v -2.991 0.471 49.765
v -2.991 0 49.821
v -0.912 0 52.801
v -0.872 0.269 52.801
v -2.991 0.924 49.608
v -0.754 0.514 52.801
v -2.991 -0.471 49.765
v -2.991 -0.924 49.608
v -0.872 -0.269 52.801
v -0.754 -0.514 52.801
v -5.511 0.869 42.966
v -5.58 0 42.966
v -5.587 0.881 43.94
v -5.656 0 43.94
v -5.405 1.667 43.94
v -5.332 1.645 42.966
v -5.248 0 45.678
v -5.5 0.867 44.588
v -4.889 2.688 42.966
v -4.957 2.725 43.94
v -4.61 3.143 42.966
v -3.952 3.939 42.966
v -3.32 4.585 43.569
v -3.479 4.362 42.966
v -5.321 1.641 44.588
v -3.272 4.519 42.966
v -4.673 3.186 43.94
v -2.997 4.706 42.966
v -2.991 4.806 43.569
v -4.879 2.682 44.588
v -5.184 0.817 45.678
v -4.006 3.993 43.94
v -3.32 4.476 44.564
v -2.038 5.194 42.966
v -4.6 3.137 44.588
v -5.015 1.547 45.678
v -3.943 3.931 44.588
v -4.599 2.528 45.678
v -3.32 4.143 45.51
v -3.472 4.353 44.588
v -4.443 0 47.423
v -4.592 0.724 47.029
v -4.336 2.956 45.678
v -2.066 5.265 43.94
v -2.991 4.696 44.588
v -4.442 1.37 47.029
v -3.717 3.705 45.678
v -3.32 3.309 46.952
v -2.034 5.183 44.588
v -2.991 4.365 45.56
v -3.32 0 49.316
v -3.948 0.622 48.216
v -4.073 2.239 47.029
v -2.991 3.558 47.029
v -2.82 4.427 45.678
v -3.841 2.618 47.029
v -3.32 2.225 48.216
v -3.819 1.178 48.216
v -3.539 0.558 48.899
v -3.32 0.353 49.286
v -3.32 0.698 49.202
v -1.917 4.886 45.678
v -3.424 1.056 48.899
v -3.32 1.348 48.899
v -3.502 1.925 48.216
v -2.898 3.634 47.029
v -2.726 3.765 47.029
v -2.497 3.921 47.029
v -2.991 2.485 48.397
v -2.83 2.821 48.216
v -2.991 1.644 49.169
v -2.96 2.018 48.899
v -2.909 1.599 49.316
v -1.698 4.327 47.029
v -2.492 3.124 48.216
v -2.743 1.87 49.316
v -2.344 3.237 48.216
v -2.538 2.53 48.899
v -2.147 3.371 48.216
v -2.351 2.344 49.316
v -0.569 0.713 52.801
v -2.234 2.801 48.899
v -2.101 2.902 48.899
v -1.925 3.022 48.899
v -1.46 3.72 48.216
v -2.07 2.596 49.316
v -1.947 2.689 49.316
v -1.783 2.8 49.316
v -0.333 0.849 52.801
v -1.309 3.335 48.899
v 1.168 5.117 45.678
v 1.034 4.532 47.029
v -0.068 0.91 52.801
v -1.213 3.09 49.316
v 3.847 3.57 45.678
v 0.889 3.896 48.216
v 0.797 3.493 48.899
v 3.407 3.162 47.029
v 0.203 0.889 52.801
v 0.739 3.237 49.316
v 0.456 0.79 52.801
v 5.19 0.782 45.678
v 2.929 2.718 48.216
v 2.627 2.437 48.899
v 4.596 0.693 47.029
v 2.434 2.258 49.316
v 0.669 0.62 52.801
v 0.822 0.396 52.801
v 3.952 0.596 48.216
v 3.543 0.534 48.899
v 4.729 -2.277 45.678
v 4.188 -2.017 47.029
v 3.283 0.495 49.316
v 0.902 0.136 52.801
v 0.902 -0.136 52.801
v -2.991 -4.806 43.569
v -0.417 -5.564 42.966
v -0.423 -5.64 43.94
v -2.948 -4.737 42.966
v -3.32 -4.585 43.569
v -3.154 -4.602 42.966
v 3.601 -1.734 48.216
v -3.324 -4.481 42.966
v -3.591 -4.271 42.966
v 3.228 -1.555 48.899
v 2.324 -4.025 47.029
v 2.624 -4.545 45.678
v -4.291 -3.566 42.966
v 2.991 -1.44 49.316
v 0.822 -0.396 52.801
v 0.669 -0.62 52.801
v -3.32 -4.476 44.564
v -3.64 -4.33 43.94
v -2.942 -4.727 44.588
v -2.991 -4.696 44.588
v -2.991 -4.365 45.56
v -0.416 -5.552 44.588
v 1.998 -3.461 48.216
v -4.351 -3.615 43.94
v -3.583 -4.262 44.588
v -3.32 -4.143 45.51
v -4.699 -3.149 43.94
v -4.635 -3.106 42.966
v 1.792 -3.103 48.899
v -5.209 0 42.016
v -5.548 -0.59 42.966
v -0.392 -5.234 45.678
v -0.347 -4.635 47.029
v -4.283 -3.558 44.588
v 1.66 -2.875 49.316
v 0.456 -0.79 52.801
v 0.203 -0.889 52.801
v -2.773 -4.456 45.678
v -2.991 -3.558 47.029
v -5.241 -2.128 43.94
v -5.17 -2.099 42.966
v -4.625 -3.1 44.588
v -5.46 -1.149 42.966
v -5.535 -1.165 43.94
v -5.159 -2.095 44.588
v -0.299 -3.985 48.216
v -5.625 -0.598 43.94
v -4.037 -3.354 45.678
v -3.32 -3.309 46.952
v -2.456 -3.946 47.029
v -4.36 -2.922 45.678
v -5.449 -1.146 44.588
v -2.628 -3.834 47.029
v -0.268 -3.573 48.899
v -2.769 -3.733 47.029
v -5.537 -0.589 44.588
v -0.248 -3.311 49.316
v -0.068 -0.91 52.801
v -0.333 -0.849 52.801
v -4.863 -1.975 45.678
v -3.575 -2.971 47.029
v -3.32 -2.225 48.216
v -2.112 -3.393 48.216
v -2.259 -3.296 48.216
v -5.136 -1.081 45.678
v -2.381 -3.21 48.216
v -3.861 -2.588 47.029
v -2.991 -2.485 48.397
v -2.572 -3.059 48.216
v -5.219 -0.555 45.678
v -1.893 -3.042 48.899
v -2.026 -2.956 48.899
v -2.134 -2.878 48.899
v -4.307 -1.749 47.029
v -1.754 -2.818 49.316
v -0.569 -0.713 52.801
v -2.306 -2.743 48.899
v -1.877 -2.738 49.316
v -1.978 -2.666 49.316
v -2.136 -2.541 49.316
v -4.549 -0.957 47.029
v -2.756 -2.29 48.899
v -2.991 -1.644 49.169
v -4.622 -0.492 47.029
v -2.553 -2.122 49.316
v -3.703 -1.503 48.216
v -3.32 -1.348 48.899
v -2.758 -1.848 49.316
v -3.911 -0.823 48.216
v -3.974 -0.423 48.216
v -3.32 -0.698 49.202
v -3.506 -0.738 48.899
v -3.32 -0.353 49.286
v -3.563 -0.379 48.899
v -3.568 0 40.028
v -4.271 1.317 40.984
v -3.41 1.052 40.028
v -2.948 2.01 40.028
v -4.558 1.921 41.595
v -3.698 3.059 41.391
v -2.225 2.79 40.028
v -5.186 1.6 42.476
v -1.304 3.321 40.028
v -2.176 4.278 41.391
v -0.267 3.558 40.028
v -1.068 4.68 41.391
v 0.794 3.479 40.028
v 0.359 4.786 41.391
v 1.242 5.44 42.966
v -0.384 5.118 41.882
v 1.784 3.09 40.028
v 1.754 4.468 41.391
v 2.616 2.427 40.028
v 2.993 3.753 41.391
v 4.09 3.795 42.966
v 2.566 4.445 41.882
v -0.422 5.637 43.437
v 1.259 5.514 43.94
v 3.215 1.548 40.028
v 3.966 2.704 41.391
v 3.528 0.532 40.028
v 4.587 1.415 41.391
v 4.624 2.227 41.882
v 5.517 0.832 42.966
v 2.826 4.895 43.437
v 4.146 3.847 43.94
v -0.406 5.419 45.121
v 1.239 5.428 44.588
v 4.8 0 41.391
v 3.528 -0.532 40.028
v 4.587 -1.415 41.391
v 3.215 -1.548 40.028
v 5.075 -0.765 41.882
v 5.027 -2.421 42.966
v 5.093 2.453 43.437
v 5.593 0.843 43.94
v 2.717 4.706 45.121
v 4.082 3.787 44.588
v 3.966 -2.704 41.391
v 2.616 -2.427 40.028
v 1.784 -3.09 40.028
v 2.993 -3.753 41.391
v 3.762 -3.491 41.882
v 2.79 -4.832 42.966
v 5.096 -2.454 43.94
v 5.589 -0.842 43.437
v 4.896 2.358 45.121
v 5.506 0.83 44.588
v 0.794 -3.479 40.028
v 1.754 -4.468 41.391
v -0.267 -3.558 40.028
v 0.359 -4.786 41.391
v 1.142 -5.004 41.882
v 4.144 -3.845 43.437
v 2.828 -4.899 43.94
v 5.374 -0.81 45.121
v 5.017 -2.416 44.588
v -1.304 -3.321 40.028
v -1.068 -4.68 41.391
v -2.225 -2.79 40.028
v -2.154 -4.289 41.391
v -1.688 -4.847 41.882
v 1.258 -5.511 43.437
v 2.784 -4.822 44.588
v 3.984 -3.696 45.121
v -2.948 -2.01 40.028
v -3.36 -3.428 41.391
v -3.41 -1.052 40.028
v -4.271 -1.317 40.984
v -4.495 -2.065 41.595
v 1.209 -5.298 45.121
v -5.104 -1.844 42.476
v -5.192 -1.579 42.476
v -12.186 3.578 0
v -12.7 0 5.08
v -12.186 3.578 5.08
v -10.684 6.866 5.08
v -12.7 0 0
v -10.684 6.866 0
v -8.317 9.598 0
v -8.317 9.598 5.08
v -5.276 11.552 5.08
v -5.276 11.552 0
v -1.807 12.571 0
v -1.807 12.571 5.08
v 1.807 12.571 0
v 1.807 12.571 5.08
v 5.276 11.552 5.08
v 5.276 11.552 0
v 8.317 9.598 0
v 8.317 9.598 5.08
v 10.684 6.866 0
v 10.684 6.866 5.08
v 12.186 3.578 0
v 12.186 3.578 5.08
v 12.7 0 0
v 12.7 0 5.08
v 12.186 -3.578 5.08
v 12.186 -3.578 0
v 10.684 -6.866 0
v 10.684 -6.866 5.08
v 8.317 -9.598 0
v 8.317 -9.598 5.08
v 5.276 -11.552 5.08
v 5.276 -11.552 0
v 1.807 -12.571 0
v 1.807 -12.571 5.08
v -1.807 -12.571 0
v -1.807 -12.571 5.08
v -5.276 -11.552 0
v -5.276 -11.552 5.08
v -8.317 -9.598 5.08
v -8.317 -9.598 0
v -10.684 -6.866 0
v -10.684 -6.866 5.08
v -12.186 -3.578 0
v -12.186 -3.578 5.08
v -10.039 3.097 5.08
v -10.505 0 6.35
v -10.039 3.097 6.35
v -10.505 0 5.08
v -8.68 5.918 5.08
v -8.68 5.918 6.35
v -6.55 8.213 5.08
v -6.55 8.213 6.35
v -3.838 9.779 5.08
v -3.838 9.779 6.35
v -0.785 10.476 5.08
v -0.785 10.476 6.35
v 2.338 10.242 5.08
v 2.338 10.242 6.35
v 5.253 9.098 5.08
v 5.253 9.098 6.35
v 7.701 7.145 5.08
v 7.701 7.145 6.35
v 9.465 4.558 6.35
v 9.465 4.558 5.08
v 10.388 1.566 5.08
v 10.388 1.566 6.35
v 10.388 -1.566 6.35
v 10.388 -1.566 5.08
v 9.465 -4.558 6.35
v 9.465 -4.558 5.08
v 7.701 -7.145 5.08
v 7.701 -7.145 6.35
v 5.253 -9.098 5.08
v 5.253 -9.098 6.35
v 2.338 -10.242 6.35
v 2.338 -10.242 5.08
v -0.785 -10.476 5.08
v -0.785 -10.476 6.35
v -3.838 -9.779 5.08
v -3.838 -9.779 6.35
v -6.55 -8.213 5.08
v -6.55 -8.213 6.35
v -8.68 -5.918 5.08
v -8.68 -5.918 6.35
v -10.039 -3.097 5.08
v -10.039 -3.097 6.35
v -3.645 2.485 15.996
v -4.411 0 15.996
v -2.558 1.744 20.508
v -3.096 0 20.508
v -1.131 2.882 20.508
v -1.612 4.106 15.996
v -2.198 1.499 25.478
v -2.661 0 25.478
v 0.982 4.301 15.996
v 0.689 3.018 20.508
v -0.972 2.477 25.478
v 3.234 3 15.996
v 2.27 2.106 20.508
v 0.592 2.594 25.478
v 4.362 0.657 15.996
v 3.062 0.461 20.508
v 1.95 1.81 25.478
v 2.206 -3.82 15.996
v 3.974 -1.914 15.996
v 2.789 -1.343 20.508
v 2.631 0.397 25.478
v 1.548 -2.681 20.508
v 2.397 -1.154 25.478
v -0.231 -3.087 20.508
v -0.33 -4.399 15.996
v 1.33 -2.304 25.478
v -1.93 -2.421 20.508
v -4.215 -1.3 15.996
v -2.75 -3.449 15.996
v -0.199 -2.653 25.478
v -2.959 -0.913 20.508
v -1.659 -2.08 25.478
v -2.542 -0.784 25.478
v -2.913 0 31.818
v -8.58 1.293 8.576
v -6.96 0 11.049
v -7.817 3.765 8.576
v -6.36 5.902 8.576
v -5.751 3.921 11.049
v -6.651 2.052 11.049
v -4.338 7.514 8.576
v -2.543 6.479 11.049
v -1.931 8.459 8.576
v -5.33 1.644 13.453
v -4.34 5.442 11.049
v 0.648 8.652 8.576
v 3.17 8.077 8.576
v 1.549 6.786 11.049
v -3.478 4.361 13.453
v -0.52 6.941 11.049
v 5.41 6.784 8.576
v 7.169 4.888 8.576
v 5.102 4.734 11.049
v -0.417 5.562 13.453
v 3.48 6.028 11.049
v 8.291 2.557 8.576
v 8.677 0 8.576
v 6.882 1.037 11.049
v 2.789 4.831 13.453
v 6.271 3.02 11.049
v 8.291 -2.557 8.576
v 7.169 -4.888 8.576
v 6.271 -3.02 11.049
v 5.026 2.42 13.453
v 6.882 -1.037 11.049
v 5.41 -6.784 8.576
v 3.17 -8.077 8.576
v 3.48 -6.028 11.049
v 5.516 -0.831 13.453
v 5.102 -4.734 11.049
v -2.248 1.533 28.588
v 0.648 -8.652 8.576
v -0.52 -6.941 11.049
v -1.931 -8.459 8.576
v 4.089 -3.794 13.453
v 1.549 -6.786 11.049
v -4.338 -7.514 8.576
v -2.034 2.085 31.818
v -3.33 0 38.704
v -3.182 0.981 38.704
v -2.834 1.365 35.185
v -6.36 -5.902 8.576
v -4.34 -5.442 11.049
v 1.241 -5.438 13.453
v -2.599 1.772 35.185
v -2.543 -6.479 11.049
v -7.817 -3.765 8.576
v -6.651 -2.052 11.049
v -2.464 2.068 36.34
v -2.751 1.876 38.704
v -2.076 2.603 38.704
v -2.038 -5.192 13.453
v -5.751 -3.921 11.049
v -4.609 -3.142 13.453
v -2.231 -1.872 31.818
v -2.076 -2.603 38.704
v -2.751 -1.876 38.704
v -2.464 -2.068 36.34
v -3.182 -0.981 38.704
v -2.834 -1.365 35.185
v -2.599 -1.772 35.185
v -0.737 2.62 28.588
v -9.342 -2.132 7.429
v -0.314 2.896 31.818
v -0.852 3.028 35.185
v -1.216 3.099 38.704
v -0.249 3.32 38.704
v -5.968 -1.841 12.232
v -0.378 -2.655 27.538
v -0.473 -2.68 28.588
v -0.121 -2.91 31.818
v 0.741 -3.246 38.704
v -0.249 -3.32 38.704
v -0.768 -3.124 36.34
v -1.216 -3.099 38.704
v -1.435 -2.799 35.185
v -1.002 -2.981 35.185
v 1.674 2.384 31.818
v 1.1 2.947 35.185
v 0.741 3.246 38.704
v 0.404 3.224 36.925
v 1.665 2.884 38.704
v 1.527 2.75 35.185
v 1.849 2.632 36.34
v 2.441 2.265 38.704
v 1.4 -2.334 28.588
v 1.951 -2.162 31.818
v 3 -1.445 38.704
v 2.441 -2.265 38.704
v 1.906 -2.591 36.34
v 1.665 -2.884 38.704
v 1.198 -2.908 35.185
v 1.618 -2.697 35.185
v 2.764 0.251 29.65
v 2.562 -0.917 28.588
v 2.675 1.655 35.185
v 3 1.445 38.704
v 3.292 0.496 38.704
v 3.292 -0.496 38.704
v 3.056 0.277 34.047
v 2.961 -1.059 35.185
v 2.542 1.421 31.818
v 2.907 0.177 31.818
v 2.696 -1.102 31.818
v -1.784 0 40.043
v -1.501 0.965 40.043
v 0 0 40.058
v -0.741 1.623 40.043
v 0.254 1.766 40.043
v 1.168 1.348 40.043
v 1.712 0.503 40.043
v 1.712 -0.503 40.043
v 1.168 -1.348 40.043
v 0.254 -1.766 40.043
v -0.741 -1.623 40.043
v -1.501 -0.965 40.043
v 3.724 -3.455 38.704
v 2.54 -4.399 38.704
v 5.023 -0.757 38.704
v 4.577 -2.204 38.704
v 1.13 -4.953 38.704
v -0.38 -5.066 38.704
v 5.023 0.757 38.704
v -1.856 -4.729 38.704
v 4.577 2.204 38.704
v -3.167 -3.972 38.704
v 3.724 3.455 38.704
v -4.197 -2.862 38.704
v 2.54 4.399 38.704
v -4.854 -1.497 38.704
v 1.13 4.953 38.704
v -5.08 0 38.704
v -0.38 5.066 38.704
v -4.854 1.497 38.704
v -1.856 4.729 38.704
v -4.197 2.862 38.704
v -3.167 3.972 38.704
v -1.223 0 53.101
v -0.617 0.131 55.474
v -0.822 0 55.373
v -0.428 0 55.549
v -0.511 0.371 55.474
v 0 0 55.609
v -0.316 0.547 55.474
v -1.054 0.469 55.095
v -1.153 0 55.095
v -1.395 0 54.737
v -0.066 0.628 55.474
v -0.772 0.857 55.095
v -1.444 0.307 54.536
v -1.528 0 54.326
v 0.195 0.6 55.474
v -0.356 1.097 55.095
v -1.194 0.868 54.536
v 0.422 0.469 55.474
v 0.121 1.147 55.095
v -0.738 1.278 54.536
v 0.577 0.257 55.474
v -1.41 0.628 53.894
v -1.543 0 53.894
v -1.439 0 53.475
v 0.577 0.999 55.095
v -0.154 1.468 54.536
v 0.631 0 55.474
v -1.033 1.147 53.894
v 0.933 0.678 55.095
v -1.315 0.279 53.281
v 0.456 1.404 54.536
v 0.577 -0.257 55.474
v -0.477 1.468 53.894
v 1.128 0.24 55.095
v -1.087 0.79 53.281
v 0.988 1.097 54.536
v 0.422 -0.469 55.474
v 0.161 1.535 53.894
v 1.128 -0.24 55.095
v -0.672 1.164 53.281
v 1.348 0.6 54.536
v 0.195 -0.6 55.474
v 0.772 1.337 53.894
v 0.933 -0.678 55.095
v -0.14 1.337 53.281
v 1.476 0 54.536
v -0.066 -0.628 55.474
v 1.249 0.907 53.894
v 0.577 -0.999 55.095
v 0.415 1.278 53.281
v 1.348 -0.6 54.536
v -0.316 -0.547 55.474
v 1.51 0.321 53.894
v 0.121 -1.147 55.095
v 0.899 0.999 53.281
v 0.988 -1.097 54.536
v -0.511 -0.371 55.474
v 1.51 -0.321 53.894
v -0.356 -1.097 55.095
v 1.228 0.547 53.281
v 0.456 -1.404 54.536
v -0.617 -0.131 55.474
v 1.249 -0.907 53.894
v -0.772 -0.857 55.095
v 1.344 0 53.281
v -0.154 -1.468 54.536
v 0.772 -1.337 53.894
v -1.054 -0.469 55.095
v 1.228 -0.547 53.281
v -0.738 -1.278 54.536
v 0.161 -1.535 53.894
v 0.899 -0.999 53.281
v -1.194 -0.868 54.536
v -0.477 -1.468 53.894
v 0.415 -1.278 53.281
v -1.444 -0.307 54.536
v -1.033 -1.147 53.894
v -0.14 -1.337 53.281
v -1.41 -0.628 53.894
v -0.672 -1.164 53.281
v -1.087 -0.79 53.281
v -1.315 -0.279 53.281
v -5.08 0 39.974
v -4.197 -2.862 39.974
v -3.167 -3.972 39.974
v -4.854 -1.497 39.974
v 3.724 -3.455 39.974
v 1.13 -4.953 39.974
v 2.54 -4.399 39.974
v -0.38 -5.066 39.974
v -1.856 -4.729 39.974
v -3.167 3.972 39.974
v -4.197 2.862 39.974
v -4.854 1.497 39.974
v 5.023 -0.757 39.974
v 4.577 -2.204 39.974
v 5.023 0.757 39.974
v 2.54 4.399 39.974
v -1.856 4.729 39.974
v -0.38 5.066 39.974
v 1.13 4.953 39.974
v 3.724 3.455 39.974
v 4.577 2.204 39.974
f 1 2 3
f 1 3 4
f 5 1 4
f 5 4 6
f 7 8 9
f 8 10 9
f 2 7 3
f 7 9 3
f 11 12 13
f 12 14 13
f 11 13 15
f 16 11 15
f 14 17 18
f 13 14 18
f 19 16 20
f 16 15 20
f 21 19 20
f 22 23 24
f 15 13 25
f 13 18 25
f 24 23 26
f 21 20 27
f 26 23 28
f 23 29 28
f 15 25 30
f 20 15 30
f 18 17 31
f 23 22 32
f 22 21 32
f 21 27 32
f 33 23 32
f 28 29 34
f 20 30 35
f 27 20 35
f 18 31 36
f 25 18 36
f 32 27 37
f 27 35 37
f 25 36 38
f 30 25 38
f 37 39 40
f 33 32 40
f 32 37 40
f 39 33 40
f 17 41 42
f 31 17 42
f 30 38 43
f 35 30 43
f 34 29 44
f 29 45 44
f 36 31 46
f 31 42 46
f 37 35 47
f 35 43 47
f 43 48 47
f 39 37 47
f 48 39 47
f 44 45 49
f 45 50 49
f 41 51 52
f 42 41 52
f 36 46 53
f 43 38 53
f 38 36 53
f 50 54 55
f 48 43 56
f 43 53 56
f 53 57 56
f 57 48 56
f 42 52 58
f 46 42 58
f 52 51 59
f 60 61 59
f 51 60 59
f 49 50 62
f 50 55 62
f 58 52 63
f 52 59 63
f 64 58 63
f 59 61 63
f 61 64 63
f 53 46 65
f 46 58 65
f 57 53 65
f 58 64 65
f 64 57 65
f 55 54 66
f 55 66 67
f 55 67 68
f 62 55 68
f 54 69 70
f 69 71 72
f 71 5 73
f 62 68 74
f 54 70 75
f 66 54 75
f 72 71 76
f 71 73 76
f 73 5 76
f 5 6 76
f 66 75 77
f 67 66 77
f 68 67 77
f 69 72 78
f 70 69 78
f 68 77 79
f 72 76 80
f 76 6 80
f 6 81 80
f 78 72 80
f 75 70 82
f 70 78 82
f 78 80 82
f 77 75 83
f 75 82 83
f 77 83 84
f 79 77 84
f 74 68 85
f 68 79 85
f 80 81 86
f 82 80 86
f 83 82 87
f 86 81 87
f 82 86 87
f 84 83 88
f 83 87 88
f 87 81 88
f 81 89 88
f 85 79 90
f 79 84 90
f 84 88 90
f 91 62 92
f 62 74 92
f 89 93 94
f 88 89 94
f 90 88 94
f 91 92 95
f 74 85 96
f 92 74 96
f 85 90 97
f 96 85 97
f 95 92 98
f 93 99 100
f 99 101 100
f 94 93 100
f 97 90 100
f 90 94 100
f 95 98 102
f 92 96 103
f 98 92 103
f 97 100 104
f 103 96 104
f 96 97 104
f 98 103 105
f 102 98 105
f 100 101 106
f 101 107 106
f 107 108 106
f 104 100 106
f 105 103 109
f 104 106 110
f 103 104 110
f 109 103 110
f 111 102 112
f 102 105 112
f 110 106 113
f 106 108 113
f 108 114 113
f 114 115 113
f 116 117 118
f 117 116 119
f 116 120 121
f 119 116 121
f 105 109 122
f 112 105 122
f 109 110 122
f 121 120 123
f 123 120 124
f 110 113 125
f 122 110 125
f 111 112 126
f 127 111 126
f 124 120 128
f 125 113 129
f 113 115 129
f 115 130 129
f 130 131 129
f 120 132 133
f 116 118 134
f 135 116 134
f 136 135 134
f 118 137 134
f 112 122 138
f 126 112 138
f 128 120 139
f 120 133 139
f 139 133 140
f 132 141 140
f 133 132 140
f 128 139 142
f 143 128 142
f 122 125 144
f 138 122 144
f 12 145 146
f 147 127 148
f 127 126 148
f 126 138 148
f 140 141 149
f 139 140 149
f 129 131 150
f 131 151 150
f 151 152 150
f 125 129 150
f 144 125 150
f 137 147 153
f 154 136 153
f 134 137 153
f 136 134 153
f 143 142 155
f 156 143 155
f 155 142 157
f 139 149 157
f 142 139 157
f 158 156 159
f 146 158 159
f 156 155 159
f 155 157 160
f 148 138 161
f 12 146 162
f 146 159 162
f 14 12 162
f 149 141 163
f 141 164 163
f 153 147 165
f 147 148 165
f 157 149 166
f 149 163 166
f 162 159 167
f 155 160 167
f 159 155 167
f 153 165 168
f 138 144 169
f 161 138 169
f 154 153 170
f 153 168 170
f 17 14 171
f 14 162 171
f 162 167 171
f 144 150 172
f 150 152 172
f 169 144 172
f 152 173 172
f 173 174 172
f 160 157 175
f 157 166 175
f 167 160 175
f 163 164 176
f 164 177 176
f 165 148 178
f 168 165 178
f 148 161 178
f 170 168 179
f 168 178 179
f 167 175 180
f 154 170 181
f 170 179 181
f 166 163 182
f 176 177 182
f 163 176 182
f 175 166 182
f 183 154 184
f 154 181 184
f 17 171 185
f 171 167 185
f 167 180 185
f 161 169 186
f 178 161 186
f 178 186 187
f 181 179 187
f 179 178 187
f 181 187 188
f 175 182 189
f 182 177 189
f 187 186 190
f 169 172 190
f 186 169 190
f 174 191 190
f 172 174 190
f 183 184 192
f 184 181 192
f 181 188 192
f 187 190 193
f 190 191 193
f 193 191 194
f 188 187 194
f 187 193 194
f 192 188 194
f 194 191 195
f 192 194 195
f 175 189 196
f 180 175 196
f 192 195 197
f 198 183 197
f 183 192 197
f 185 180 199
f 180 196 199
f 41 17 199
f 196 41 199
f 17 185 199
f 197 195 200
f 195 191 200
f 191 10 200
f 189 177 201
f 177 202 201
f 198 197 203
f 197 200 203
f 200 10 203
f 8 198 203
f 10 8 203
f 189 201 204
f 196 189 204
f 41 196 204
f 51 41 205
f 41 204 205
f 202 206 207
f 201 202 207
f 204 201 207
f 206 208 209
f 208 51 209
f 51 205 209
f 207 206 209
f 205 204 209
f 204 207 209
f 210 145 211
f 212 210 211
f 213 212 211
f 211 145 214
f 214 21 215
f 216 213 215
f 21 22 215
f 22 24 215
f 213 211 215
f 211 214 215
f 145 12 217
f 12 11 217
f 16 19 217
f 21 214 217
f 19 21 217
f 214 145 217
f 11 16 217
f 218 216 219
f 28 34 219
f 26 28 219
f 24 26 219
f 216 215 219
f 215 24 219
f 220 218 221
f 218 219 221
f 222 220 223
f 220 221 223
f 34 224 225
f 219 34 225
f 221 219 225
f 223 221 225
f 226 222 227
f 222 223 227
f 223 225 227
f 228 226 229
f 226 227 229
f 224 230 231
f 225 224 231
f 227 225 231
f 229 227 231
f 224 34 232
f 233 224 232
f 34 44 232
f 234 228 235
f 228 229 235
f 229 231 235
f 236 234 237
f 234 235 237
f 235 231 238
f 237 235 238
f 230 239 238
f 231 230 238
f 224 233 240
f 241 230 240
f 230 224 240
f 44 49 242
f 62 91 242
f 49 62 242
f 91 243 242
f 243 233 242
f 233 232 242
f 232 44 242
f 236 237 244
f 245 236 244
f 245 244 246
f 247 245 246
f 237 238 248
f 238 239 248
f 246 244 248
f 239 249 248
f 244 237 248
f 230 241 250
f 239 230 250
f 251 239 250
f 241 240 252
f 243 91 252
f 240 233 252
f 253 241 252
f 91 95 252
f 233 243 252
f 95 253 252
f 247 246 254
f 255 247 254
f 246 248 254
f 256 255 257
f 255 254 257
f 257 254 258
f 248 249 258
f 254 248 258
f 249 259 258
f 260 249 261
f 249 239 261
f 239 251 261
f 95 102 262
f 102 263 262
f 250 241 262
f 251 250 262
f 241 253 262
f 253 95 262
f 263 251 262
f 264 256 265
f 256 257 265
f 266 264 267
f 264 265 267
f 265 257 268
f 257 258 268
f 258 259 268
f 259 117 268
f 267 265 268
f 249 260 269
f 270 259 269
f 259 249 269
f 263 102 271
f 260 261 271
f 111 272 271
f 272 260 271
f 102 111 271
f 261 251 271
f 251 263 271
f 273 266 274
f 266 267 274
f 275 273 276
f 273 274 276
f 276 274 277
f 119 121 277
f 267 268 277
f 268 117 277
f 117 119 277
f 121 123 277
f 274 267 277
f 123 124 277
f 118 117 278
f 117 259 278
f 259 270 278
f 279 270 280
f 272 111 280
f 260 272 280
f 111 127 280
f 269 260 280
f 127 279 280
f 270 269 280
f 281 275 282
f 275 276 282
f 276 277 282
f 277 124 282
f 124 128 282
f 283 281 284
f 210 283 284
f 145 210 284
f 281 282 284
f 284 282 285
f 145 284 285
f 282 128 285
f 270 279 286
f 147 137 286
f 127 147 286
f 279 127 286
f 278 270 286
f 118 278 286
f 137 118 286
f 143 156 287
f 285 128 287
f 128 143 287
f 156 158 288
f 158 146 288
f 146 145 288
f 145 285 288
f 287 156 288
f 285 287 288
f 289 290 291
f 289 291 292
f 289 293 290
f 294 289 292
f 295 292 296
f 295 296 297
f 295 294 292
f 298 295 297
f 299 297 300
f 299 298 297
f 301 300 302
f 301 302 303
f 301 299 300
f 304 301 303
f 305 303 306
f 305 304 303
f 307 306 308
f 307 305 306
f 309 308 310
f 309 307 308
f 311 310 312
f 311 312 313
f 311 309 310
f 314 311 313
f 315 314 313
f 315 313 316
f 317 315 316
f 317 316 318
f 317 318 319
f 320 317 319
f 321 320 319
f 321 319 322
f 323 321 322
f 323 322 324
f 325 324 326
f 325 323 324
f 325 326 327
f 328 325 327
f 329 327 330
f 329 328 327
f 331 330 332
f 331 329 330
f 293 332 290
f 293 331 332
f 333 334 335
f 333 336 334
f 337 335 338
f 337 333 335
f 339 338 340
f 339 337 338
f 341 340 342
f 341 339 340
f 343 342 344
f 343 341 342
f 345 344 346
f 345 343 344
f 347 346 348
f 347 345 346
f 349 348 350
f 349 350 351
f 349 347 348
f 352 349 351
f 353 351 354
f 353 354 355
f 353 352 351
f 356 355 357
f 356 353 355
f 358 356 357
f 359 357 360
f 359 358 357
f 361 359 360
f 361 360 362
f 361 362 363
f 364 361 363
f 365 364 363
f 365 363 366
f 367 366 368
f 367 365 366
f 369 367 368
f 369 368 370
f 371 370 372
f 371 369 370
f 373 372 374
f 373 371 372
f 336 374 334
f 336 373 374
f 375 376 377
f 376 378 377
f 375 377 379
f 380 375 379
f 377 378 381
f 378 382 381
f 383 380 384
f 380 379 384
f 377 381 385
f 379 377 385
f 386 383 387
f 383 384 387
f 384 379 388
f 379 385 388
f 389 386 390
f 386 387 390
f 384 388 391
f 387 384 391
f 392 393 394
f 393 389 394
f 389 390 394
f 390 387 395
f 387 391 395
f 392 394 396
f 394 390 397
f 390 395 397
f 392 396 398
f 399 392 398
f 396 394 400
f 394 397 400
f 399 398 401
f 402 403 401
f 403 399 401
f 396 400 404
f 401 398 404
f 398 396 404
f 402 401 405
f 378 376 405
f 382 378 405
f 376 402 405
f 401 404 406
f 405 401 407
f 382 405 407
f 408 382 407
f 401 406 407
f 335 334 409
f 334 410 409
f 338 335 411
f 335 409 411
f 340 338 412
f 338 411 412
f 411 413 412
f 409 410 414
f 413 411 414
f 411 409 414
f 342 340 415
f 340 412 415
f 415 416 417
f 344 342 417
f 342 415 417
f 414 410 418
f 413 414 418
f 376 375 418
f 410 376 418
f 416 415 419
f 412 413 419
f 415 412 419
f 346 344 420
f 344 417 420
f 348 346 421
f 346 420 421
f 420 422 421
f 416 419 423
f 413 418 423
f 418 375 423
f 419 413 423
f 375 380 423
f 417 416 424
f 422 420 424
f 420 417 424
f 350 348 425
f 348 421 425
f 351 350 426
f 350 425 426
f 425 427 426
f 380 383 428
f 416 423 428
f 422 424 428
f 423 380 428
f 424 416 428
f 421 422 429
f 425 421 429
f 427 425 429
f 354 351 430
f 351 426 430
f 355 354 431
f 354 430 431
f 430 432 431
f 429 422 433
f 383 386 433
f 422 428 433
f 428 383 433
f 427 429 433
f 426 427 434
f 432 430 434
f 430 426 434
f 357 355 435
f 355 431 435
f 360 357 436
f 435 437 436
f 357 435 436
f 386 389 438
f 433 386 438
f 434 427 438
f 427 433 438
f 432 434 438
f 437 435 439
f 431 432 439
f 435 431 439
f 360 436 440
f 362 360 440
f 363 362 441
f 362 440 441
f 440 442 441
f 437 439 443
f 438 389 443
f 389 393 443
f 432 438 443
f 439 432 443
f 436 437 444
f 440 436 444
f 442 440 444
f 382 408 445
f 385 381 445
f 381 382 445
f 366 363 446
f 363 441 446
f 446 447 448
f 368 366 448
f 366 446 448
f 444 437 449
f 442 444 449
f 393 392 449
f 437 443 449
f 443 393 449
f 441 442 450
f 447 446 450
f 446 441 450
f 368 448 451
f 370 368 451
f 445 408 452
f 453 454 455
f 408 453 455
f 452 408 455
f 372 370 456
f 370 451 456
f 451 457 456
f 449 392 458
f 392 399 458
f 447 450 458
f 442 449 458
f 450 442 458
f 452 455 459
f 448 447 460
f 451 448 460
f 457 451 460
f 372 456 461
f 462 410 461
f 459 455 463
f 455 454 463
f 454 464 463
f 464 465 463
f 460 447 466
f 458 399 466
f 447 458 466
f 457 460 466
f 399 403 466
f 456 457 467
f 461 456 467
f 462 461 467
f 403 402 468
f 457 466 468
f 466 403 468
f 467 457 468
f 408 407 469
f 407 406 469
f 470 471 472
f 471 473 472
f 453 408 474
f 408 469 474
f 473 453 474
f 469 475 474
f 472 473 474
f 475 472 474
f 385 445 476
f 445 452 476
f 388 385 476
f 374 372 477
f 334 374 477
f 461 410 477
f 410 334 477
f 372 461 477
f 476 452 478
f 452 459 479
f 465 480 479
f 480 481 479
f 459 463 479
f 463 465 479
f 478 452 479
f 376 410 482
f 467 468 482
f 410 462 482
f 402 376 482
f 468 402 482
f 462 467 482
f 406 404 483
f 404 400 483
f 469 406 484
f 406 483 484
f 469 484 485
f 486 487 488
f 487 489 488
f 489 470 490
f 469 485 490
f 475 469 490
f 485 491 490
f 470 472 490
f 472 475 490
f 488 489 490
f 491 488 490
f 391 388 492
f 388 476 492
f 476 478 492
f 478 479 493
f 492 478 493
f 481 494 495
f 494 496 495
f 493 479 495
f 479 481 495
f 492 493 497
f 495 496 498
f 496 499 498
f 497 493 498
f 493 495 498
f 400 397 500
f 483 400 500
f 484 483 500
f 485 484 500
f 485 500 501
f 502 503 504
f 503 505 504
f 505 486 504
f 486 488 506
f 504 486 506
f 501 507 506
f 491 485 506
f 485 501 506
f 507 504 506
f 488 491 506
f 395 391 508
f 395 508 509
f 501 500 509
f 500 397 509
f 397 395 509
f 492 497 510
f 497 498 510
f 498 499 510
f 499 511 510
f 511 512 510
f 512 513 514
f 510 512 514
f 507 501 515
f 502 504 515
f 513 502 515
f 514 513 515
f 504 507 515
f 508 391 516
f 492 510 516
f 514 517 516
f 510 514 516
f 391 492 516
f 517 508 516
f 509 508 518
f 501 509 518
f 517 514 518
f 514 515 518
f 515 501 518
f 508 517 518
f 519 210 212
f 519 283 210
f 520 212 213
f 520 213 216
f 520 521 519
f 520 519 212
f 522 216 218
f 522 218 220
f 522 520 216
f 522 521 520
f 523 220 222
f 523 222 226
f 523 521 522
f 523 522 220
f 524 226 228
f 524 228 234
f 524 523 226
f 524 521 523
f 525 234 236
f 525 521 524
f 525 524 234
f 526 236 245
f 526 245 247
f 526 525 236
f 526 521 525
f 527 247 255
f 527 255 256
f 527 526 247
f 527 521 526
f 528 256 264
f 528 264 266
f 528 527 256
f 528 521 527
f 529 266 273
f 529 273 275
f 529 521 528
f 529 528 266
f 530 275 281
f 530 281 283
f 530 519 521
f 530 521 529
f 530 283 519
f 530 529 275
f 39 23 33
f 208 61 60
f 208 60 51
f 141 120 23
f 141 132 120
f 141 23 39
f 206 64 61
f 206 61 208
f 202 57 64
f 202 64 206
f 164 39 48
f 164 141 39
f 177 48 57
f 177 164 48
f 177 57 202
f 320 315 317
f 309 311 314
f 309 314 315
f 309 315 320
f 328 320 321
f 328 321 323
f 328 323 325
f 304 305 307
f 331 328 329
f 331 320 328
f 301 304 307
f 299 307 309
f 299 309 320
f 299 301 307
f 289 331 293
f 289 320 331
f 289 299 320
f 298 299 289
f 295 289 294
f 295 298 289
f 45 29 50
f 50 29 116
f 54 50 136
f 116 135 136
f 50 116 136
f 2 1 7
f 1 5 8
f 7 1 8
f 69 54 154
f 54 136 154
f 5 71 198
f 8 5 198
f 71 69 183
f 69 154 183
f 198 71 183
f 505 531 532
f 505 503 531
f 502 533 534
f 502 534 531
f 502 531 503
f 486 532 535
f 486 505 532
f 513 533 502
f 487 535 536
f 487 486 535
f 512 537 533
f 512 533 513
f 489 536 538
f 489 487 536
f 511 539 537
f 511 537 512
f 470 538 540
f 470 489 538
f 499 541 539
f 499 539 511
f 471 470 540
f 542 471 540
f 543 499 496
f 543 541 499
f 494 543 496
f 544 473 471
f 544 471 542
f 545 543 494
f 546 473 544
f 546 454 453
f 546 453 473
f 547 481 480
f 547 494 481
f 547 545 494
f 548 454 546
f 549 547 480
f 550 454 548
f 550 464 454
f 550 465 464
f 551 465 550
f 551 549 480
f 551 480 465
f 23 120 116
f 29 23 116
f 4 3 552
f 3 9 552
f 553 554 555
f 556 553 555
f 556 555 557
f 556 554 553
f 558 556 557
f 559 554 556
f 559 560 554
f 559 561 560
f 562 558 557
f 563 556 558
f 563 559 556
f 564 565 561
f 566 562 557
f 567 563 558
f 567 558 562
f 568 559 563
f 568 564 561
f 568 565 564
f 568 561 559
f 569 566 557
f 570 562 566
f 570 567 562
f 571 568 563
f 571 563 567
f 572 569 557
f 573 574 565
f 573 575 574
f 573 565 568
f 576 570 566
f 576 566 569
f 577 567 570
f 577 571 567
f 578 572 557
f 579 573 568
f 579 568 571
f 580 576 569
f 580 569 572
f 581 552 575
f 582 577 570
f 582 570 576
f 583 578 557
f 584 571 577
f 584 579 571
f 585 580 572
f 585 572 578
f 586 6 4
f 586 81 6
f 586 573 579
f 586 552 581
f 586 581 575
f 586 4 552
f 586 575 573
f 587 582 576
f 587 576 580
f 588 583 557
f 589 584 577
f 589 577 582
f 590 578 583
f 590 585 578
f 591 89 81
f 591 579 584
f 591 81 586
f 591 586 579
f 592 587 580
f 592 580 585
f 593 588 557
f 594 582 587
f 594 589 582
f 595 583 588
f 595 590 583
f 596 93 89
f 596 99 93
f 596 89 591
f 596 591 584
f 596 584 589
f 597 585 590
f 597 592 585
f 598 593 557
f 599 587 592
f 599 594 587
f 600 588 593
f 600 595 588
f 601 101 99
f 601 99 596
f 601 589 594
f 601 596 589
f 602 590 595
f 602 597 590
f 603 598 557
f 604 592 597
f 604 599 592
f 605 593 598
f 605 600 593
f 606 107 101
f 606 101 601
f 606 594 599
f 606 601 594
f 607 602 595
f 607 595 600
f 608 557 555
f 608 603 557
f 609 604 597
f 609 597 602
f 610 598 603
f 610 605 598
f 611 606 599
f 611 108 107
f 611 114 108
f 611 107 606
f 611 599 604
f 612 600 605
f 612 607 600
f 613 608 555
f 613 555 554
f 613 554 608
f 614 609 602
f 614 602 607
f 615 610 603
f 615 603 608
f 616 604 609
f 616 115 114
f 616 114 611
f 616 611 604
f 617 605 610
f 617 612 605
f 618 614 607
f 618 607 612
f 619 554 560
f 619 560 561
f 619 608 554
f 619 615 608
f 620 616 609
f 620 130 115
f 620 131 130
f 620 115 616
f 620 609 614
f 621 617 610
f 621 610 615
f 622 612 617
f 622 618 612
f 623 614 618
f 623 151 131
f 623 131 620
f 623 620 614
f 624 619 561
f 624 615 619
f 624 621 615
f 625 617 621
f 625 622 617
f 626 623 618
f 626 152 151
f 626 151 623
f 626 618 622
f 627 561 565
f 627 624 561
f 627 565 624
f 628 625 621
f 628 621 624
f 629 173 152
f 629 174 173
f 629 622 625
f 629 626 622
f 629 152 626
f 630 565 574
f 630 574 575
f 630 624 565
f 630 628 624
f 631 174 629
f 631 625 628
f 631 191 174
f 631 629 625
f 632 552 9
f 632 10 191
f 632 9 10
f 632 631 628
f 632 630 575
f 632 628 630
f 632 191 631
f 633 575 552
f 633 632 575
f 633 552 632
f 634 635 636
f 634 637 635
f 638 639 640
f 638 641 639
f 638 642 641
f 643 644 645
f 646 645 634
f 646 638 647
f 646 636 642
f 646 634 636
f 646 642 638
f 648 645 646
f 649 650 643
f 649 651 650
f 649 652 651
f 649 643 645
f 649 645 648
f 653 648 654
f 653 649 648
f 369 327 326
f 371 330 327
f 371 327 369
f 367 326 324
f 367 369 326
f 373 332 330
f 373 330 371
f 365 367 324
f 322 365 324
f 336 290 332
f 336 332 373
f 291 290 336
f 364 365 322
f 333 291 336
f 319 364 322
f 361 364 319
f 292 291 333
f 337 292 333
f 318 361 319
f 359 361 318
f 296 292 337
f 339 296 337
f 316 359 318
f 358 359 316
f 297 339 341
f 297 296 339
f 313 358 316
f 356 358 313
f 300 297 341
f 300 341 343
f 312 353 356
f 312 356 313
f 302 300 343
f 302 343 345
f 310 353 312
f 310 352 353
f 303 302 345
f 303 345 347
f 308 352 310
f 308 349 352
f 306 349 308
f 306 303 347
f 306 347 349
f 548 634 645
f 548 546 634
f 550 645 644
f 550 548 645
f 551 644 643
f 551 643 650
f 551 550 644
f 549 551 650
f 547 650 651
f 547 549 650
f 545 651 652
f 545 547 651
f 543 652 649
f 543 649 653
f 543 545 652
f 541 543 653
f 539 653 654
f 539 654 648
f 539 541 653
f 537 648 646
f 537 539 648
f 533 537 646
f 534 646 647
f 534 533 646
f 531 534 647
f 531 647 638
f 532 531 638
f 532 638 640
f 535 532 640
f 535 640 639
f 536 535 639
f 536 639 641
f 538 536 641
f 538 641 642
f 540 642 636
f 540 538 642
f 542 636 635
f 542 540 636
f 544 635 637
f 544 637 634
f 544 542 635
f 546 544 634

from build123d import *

# Parameters (mm, degrees)
F4_W     = 0.3285910934
F4_H     = 7.1961395442
F5_DEPTH = 38.1


with BuildPart() as f1:
    # F0 (on Front) → F1 (revolve)
    with BuildSketch(Plane.XZ):
        Polygon((-12.7, 0), (0, 0), (0, 5.08), (-10.5053622615, 5.08), (-12.7, 5.08), align=None)
        with BuildLine():
            Line((-10.5053622615, 5.08), (0, 5.08))
            Line((0, 5.08), (0, 21.745795384))
            Line((0, 21.745795384), (0, 27.4026617408))
            Line((0, 27.4026617408), (0, 38.7036968023))
            Line((0, 38.7036968023), (-3.3295838776, 38.7036968023))
            add(Edge.make_bspline(
                [(-10.5053622615, 6.35), (-7.3788208176, 9.8647244593), (-1.0393221328, 19.8952411603), (-3.0709053347, 31.5606674913), (-3.3295838776, 38.7036968023)],
                knots=[0, 0, 0, 0, 0.4719940767, 1, 1, 1, 1], degree=3))
            Line((-10.5053622615, 6.35), (-10.5053622615, 5.08))
        make_face()
        Polygon((-5.08, 38.7036968023), (-3.3295838776, 38.7036968023), (0, 38.7036968023), (0, 39.9736968023), (-5.08, 39.9736968023), align=None)
    revolve(axis=Axis((0, 0, 5.423108103), (0, 0, -1)))


with BuildPart() as f3:
    # F2 (on Front) → F3 (revolve)
    with BuildSketch(Plane.XZ):
        with BuildLine():
            add(Edge.make_bspline(
                [(-3.5681407899, 40.0277860463), (-4.6070800737, 41.0838558378), (-7.2020180746, 43.7215803675), (-3.4235417343, 49.3261366901), (-0.9121126212, 52.8011838167)],
                knots=[0, 0, 0, 0, 0.3734712996, 0.9328118424, 0.9328118424, 0.9328118424, 0.9328118424], degree=3))
            Line((-3.5681407899, 40.0277860463), (0, 40.0581508875))
            Line((0, 40.0581508875), (0, 54.0567561984))
            add(Edge.make_bspline(
                [(-0.9121126212, 52.8011838167), (-0.6104389858, 53.2186075434), (-0.3052194929, 53.6376818709), (0, 54.0567561984)],
                knots=[0.9328118424, 0.9328118424, 0.9328118424, 0.9328118424, 1, 1, 1, 1], degree=3))
        make_face()
        with BuildLine():
            ThreePointArc((0, 55.6086619428), (-1.4759643341, 54.5362775471), (-0.9121126212, 52.8011838167))
            add(Edge.make_bspline(
                [(-0.9121126212, 52.8011838167), (-0.6104389858, 53.2186075434), (-0.3052194929, 53.6376818709), (0, 54.0567561984)],
                knots=[0.9328118424, 0.9328118424, 0.9328118424, 0.9328118424, 1, 1, 1, 1], degree=3))
            Line((0, 54.0567561984), (0, 55.6086619428))
        make_face()
    revolve(axis=Axis((0, 0, 54.8528488725), (0, 0, -1)))

    # F4 (on Front) → F5 (cut, symmetric)
    with BuildSketch(Plane.XZ):
        with Locations((-3.1555218156, 47.1674222499)):
            Rectangle(F4_W, F4_H)
    extrude(amount=F5_DEPTH, both=True, mode=Mode.SUBTRACT)


solid = Compound([f1.part, f3.part])
